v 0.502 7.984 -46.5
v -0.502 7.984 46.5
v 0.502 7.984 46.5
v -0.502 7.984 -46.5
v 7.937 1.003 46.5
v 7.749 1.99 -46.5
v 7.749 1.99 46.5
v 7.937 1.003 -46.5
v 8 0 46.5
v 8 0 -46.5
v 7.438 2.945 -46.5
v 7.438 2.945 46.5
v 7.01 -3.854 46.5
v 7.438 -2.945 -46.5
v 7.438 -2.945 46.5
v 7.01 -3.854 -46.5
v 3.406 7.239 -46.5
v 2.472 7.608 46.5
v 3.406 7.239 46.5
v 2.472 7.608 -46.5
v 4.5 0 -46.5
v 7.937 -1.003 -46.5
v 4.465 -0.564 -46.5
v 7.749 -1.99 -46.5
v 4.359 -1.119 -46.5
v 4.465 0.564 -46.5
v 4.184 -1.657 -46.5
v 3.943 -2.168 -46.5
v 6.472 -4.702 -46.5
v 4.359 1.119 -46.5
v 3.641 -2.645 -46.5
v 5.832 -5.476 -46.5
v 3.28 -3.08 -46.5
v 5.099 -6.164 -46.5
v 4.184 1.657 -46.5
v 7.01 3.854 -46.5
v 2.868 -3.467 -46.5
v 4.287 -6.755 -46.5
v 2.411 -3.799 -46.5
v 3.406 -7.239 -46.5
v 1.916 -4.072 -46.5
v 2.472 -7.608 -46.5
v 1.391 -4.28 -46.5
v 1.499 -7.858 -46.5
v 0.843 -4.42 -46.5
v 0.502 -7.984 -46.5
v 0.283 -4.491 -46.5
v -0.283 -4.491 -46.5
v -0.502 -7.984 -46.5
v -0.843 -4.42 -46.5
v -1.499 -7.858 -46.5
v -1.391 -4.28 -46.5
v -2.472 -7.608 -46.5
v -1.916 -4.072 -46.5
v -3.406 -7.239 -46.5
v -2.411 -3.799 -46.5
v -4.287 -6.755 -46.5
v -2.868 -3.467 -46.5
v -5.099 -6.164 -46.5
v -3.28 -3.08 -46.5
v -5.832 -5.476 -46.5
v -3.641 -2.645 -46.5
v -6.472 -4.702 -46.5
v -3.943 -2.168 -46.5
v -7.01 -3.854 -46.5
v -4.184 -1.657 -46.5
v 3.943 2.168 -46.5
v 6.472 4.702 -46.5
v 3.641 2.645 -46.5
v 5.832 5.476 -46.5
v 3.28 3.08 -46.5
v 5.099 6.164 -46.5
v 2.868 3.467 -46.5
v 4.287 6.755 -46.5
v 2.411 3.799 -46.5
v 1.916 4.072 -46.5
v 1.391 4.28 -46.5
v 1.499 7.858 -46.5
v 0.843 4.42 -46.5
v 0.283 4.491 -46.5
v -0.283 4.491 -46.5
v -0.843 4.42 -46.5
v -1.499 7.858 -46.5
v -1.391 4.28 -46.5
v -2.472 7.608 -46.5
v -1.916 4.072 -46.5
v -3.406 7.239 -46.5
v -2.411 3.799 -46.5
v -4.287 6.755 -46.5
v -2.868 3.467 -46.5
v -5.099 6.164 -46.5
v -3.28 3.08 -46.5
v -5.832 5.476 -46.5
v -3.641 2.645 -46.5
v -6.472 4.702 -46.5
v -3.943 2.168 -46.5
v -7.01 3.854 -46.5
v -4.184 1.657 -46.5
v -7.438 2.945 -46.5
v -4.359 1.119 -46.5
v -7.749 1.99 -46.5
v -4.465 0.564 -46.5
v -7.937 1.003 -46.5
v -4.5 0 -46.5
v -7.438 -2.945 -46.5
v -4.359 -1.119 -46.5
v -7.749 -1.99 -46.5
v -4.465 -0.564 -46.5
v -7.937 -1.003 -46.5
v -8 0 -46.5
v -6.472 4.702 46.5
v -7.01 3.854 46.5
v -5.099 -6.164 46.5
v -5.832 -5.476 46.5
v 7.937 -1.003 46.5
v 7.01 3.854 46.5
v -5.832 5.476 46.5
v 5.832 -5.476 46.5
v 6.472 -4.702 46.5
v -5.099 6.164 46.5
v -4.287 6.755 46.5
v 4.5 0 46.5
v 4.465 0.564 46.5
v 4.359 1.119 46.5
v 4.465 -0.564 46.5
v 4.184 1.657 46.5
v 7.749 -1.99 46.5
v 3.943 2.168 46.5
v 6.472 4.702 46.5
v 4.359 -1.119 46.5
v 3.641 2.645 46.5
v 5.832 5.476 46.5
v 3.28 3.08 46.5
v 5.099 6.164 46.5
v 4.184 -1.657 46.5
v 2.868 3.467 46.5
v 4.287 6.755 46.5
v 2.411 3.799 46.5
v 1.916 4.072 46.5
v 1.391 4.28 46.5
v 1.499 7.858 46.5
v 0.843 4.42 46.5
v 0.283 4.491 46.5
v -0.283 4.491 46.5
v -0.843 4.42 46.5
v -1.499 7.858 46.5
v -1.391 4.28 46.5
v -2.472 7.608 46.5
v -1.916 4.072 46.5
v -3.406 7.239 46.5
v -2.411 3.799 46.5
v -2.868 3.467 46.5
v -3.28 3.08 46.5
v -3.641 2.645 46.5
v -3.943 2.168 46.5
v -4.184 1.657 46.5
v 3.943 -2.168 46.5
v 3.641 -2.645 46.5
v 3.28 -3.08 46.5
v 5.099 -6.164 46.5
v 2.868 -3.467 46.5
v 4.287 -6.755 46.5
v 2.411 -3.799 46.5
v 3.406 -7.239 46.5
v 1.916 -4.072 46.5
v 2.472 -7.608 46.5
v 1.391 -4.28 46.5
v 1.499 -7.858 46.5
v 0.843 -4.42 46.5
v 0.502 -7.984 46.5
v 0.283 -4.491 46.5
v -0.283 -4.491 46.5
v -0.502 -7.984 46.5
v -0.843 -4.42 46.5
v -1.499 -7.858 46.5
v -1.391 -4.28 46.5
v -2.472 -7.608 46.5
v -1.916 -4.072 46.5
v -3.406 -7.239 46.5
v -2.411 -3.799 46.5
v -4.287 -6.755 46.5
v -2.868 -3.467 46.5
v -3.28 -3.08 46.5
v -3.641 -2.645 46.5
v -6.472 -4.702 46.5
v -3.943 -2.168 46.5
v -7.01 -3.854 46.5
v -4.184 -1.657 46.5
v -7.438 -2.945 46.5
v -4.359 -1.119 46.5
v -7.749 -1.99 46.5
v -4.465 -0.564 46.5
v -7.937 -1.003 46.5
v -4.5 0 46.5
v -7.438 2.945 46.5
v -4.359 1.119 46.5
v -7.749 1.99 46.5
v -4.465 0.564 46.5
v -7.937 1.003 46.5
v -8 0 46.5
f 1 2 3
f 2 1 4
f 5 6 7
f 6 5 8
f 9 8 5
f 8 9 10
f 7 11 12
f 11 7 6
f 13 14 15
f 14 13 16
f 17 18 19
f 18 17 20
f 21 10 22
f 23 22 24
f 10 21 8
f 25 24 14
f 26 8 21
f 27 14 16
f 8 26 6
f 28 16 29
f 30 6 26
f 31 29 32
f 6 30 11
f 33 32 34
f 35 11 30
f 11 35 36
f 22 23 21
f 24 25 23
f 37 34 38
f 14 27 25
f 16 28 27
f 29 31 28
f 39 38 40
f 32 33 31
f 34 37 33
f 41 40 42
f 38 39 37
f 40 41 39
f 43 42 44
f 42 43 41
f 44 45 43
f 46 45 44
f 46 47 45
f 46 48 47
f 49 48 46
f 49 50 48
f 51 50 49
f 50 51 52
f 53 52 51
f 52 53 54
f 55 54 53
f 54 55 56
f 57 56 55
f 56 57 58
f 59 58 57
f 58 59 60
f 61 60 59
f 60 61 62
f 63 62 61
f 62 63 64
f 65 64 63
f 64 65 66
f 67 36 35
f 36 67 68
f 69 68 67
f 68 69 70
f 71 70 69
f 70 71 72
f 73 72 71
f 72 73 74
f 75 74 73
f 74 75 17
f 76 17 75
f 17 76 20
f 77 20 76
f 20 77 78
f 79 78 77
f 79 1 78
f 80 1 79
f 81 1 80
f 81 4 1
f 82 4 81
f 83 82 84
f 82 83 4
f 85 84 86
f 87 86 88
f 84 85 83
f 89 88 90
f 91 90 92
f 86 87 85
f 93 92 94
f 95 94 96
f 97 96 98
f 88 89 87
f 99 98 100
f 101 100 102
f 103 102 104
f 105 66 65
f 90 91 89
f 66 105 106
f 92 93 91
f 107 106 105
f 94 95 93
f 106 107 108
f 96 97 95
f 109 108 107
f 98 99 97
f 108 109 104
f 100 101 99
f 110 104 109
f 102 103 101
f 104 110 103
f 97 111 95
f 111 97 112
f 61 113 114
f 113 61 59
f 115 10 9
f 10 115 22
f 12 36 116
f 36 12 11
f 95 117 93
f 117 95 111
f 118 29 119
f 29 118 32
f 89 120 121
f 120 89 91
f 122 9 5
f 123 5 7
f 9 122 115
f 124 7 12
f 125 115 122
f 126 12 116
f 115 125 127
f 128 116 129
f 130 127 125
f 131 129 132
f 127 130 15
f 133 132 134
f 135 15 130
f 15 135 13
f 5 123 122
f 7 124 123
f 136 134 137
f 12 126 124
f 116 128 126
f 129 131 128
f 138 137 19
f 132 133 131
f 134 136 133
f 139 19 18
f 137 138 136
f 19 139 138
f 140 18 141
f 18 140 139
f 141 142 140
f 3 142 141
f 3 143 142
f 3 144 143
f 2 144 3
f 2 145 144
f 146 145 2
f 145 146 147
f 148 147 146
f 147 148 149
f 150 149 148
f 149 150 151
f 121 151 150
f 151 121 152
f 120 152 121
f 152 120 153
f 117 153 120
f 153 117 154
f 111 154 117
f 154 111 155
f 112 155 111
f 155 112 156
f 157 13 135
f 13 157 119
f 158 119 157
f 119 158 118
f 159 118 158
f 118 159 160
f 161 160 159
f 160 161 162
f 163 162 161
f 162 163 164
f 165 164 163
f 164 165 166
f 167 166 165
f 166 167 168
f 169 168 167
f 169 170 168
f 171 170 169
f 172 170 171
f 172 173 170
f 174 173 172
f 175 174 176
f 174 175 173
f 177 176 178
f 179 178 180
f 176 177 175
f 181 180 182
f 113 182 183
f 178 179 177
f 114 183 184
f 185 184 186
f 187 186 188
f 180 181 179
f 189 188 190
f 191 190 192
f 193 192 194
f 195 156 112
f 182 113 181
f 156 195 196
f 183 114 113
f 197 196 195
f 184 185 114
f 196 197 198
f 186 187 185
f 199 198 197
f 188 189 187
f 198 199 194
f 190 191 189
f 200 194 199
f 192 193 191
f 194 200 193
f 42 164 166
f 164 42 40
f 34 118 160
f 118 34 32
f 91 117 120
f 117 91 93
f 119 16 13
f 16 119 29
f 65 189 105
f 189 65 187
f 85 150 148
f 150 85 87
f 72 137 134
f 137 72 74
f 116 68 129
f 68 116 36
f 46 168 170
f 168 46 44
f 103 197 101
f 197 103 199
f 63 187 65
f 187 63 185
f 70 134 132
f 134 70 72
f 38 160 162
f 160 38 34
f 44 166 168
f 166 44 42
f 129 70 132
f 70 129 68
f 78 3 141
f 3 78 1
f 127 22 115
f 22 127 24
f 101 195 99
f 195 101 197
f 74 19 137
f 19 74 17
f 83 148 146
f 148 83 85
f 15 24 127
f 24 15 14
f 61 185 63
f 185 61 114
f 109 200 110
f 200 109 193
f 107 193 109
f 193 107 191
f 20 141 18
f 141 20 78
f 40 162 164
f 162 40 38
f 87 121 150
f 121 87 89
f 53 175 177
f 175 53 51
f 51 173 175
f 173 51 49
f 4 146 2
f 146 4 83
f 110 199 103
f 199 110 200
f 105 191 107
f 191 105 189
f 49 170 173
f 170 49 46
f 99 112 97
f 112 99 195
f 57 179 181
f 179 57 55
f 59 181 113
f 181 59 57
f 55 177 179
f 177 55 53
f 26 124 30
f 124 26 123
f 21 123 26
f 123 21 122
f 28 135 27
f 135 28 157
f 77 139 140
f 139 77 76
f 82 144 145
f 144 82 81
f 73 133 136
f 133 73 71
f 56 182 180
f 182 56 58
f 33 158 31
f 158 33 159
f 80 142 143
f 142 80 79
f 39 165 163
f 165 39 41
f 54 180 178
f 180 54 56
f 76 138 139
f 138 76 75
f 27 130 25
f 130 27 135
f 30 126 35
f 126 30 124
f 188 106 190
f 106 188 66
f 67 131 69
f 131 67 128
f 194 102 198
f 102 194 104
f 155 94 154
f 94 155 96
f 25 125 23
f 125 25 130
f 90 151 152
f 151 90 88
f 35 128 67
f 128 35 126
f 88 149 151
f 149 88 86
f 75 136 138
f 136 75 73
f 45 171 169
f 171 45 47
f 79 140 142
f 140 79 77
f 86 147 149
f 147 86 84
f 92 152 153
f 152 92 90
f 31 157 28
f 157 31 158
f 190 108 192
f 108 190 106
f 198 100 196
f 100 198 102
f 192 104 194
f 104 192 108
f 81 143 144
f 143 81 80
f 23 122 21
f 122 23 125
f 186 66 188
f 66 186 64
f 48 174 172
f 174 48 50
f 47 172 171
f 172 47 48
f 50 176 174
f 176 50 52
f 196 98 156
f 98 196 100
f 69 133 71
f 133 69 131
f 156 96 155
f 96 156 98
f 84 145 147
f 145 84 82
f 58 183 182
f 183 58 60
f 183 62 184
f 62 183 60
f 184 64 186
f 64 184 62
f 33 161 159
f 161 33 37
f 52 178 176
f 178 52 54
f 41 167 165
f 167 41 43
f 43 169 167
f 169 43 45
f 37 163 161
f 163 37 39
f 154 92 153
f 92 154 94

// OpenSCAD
$fn = 50;


difference() {
	union() {
		translate(v = [0, 0, -46.5000000000]) {
			cylinder(h = 93, r = 8.0000000000);
		}
	}
	union() {
		translate(v = [0, 0, -100.0000000000]) {
			cylinder(h = 200, r = 4.5000000000);
		}
	}
}
